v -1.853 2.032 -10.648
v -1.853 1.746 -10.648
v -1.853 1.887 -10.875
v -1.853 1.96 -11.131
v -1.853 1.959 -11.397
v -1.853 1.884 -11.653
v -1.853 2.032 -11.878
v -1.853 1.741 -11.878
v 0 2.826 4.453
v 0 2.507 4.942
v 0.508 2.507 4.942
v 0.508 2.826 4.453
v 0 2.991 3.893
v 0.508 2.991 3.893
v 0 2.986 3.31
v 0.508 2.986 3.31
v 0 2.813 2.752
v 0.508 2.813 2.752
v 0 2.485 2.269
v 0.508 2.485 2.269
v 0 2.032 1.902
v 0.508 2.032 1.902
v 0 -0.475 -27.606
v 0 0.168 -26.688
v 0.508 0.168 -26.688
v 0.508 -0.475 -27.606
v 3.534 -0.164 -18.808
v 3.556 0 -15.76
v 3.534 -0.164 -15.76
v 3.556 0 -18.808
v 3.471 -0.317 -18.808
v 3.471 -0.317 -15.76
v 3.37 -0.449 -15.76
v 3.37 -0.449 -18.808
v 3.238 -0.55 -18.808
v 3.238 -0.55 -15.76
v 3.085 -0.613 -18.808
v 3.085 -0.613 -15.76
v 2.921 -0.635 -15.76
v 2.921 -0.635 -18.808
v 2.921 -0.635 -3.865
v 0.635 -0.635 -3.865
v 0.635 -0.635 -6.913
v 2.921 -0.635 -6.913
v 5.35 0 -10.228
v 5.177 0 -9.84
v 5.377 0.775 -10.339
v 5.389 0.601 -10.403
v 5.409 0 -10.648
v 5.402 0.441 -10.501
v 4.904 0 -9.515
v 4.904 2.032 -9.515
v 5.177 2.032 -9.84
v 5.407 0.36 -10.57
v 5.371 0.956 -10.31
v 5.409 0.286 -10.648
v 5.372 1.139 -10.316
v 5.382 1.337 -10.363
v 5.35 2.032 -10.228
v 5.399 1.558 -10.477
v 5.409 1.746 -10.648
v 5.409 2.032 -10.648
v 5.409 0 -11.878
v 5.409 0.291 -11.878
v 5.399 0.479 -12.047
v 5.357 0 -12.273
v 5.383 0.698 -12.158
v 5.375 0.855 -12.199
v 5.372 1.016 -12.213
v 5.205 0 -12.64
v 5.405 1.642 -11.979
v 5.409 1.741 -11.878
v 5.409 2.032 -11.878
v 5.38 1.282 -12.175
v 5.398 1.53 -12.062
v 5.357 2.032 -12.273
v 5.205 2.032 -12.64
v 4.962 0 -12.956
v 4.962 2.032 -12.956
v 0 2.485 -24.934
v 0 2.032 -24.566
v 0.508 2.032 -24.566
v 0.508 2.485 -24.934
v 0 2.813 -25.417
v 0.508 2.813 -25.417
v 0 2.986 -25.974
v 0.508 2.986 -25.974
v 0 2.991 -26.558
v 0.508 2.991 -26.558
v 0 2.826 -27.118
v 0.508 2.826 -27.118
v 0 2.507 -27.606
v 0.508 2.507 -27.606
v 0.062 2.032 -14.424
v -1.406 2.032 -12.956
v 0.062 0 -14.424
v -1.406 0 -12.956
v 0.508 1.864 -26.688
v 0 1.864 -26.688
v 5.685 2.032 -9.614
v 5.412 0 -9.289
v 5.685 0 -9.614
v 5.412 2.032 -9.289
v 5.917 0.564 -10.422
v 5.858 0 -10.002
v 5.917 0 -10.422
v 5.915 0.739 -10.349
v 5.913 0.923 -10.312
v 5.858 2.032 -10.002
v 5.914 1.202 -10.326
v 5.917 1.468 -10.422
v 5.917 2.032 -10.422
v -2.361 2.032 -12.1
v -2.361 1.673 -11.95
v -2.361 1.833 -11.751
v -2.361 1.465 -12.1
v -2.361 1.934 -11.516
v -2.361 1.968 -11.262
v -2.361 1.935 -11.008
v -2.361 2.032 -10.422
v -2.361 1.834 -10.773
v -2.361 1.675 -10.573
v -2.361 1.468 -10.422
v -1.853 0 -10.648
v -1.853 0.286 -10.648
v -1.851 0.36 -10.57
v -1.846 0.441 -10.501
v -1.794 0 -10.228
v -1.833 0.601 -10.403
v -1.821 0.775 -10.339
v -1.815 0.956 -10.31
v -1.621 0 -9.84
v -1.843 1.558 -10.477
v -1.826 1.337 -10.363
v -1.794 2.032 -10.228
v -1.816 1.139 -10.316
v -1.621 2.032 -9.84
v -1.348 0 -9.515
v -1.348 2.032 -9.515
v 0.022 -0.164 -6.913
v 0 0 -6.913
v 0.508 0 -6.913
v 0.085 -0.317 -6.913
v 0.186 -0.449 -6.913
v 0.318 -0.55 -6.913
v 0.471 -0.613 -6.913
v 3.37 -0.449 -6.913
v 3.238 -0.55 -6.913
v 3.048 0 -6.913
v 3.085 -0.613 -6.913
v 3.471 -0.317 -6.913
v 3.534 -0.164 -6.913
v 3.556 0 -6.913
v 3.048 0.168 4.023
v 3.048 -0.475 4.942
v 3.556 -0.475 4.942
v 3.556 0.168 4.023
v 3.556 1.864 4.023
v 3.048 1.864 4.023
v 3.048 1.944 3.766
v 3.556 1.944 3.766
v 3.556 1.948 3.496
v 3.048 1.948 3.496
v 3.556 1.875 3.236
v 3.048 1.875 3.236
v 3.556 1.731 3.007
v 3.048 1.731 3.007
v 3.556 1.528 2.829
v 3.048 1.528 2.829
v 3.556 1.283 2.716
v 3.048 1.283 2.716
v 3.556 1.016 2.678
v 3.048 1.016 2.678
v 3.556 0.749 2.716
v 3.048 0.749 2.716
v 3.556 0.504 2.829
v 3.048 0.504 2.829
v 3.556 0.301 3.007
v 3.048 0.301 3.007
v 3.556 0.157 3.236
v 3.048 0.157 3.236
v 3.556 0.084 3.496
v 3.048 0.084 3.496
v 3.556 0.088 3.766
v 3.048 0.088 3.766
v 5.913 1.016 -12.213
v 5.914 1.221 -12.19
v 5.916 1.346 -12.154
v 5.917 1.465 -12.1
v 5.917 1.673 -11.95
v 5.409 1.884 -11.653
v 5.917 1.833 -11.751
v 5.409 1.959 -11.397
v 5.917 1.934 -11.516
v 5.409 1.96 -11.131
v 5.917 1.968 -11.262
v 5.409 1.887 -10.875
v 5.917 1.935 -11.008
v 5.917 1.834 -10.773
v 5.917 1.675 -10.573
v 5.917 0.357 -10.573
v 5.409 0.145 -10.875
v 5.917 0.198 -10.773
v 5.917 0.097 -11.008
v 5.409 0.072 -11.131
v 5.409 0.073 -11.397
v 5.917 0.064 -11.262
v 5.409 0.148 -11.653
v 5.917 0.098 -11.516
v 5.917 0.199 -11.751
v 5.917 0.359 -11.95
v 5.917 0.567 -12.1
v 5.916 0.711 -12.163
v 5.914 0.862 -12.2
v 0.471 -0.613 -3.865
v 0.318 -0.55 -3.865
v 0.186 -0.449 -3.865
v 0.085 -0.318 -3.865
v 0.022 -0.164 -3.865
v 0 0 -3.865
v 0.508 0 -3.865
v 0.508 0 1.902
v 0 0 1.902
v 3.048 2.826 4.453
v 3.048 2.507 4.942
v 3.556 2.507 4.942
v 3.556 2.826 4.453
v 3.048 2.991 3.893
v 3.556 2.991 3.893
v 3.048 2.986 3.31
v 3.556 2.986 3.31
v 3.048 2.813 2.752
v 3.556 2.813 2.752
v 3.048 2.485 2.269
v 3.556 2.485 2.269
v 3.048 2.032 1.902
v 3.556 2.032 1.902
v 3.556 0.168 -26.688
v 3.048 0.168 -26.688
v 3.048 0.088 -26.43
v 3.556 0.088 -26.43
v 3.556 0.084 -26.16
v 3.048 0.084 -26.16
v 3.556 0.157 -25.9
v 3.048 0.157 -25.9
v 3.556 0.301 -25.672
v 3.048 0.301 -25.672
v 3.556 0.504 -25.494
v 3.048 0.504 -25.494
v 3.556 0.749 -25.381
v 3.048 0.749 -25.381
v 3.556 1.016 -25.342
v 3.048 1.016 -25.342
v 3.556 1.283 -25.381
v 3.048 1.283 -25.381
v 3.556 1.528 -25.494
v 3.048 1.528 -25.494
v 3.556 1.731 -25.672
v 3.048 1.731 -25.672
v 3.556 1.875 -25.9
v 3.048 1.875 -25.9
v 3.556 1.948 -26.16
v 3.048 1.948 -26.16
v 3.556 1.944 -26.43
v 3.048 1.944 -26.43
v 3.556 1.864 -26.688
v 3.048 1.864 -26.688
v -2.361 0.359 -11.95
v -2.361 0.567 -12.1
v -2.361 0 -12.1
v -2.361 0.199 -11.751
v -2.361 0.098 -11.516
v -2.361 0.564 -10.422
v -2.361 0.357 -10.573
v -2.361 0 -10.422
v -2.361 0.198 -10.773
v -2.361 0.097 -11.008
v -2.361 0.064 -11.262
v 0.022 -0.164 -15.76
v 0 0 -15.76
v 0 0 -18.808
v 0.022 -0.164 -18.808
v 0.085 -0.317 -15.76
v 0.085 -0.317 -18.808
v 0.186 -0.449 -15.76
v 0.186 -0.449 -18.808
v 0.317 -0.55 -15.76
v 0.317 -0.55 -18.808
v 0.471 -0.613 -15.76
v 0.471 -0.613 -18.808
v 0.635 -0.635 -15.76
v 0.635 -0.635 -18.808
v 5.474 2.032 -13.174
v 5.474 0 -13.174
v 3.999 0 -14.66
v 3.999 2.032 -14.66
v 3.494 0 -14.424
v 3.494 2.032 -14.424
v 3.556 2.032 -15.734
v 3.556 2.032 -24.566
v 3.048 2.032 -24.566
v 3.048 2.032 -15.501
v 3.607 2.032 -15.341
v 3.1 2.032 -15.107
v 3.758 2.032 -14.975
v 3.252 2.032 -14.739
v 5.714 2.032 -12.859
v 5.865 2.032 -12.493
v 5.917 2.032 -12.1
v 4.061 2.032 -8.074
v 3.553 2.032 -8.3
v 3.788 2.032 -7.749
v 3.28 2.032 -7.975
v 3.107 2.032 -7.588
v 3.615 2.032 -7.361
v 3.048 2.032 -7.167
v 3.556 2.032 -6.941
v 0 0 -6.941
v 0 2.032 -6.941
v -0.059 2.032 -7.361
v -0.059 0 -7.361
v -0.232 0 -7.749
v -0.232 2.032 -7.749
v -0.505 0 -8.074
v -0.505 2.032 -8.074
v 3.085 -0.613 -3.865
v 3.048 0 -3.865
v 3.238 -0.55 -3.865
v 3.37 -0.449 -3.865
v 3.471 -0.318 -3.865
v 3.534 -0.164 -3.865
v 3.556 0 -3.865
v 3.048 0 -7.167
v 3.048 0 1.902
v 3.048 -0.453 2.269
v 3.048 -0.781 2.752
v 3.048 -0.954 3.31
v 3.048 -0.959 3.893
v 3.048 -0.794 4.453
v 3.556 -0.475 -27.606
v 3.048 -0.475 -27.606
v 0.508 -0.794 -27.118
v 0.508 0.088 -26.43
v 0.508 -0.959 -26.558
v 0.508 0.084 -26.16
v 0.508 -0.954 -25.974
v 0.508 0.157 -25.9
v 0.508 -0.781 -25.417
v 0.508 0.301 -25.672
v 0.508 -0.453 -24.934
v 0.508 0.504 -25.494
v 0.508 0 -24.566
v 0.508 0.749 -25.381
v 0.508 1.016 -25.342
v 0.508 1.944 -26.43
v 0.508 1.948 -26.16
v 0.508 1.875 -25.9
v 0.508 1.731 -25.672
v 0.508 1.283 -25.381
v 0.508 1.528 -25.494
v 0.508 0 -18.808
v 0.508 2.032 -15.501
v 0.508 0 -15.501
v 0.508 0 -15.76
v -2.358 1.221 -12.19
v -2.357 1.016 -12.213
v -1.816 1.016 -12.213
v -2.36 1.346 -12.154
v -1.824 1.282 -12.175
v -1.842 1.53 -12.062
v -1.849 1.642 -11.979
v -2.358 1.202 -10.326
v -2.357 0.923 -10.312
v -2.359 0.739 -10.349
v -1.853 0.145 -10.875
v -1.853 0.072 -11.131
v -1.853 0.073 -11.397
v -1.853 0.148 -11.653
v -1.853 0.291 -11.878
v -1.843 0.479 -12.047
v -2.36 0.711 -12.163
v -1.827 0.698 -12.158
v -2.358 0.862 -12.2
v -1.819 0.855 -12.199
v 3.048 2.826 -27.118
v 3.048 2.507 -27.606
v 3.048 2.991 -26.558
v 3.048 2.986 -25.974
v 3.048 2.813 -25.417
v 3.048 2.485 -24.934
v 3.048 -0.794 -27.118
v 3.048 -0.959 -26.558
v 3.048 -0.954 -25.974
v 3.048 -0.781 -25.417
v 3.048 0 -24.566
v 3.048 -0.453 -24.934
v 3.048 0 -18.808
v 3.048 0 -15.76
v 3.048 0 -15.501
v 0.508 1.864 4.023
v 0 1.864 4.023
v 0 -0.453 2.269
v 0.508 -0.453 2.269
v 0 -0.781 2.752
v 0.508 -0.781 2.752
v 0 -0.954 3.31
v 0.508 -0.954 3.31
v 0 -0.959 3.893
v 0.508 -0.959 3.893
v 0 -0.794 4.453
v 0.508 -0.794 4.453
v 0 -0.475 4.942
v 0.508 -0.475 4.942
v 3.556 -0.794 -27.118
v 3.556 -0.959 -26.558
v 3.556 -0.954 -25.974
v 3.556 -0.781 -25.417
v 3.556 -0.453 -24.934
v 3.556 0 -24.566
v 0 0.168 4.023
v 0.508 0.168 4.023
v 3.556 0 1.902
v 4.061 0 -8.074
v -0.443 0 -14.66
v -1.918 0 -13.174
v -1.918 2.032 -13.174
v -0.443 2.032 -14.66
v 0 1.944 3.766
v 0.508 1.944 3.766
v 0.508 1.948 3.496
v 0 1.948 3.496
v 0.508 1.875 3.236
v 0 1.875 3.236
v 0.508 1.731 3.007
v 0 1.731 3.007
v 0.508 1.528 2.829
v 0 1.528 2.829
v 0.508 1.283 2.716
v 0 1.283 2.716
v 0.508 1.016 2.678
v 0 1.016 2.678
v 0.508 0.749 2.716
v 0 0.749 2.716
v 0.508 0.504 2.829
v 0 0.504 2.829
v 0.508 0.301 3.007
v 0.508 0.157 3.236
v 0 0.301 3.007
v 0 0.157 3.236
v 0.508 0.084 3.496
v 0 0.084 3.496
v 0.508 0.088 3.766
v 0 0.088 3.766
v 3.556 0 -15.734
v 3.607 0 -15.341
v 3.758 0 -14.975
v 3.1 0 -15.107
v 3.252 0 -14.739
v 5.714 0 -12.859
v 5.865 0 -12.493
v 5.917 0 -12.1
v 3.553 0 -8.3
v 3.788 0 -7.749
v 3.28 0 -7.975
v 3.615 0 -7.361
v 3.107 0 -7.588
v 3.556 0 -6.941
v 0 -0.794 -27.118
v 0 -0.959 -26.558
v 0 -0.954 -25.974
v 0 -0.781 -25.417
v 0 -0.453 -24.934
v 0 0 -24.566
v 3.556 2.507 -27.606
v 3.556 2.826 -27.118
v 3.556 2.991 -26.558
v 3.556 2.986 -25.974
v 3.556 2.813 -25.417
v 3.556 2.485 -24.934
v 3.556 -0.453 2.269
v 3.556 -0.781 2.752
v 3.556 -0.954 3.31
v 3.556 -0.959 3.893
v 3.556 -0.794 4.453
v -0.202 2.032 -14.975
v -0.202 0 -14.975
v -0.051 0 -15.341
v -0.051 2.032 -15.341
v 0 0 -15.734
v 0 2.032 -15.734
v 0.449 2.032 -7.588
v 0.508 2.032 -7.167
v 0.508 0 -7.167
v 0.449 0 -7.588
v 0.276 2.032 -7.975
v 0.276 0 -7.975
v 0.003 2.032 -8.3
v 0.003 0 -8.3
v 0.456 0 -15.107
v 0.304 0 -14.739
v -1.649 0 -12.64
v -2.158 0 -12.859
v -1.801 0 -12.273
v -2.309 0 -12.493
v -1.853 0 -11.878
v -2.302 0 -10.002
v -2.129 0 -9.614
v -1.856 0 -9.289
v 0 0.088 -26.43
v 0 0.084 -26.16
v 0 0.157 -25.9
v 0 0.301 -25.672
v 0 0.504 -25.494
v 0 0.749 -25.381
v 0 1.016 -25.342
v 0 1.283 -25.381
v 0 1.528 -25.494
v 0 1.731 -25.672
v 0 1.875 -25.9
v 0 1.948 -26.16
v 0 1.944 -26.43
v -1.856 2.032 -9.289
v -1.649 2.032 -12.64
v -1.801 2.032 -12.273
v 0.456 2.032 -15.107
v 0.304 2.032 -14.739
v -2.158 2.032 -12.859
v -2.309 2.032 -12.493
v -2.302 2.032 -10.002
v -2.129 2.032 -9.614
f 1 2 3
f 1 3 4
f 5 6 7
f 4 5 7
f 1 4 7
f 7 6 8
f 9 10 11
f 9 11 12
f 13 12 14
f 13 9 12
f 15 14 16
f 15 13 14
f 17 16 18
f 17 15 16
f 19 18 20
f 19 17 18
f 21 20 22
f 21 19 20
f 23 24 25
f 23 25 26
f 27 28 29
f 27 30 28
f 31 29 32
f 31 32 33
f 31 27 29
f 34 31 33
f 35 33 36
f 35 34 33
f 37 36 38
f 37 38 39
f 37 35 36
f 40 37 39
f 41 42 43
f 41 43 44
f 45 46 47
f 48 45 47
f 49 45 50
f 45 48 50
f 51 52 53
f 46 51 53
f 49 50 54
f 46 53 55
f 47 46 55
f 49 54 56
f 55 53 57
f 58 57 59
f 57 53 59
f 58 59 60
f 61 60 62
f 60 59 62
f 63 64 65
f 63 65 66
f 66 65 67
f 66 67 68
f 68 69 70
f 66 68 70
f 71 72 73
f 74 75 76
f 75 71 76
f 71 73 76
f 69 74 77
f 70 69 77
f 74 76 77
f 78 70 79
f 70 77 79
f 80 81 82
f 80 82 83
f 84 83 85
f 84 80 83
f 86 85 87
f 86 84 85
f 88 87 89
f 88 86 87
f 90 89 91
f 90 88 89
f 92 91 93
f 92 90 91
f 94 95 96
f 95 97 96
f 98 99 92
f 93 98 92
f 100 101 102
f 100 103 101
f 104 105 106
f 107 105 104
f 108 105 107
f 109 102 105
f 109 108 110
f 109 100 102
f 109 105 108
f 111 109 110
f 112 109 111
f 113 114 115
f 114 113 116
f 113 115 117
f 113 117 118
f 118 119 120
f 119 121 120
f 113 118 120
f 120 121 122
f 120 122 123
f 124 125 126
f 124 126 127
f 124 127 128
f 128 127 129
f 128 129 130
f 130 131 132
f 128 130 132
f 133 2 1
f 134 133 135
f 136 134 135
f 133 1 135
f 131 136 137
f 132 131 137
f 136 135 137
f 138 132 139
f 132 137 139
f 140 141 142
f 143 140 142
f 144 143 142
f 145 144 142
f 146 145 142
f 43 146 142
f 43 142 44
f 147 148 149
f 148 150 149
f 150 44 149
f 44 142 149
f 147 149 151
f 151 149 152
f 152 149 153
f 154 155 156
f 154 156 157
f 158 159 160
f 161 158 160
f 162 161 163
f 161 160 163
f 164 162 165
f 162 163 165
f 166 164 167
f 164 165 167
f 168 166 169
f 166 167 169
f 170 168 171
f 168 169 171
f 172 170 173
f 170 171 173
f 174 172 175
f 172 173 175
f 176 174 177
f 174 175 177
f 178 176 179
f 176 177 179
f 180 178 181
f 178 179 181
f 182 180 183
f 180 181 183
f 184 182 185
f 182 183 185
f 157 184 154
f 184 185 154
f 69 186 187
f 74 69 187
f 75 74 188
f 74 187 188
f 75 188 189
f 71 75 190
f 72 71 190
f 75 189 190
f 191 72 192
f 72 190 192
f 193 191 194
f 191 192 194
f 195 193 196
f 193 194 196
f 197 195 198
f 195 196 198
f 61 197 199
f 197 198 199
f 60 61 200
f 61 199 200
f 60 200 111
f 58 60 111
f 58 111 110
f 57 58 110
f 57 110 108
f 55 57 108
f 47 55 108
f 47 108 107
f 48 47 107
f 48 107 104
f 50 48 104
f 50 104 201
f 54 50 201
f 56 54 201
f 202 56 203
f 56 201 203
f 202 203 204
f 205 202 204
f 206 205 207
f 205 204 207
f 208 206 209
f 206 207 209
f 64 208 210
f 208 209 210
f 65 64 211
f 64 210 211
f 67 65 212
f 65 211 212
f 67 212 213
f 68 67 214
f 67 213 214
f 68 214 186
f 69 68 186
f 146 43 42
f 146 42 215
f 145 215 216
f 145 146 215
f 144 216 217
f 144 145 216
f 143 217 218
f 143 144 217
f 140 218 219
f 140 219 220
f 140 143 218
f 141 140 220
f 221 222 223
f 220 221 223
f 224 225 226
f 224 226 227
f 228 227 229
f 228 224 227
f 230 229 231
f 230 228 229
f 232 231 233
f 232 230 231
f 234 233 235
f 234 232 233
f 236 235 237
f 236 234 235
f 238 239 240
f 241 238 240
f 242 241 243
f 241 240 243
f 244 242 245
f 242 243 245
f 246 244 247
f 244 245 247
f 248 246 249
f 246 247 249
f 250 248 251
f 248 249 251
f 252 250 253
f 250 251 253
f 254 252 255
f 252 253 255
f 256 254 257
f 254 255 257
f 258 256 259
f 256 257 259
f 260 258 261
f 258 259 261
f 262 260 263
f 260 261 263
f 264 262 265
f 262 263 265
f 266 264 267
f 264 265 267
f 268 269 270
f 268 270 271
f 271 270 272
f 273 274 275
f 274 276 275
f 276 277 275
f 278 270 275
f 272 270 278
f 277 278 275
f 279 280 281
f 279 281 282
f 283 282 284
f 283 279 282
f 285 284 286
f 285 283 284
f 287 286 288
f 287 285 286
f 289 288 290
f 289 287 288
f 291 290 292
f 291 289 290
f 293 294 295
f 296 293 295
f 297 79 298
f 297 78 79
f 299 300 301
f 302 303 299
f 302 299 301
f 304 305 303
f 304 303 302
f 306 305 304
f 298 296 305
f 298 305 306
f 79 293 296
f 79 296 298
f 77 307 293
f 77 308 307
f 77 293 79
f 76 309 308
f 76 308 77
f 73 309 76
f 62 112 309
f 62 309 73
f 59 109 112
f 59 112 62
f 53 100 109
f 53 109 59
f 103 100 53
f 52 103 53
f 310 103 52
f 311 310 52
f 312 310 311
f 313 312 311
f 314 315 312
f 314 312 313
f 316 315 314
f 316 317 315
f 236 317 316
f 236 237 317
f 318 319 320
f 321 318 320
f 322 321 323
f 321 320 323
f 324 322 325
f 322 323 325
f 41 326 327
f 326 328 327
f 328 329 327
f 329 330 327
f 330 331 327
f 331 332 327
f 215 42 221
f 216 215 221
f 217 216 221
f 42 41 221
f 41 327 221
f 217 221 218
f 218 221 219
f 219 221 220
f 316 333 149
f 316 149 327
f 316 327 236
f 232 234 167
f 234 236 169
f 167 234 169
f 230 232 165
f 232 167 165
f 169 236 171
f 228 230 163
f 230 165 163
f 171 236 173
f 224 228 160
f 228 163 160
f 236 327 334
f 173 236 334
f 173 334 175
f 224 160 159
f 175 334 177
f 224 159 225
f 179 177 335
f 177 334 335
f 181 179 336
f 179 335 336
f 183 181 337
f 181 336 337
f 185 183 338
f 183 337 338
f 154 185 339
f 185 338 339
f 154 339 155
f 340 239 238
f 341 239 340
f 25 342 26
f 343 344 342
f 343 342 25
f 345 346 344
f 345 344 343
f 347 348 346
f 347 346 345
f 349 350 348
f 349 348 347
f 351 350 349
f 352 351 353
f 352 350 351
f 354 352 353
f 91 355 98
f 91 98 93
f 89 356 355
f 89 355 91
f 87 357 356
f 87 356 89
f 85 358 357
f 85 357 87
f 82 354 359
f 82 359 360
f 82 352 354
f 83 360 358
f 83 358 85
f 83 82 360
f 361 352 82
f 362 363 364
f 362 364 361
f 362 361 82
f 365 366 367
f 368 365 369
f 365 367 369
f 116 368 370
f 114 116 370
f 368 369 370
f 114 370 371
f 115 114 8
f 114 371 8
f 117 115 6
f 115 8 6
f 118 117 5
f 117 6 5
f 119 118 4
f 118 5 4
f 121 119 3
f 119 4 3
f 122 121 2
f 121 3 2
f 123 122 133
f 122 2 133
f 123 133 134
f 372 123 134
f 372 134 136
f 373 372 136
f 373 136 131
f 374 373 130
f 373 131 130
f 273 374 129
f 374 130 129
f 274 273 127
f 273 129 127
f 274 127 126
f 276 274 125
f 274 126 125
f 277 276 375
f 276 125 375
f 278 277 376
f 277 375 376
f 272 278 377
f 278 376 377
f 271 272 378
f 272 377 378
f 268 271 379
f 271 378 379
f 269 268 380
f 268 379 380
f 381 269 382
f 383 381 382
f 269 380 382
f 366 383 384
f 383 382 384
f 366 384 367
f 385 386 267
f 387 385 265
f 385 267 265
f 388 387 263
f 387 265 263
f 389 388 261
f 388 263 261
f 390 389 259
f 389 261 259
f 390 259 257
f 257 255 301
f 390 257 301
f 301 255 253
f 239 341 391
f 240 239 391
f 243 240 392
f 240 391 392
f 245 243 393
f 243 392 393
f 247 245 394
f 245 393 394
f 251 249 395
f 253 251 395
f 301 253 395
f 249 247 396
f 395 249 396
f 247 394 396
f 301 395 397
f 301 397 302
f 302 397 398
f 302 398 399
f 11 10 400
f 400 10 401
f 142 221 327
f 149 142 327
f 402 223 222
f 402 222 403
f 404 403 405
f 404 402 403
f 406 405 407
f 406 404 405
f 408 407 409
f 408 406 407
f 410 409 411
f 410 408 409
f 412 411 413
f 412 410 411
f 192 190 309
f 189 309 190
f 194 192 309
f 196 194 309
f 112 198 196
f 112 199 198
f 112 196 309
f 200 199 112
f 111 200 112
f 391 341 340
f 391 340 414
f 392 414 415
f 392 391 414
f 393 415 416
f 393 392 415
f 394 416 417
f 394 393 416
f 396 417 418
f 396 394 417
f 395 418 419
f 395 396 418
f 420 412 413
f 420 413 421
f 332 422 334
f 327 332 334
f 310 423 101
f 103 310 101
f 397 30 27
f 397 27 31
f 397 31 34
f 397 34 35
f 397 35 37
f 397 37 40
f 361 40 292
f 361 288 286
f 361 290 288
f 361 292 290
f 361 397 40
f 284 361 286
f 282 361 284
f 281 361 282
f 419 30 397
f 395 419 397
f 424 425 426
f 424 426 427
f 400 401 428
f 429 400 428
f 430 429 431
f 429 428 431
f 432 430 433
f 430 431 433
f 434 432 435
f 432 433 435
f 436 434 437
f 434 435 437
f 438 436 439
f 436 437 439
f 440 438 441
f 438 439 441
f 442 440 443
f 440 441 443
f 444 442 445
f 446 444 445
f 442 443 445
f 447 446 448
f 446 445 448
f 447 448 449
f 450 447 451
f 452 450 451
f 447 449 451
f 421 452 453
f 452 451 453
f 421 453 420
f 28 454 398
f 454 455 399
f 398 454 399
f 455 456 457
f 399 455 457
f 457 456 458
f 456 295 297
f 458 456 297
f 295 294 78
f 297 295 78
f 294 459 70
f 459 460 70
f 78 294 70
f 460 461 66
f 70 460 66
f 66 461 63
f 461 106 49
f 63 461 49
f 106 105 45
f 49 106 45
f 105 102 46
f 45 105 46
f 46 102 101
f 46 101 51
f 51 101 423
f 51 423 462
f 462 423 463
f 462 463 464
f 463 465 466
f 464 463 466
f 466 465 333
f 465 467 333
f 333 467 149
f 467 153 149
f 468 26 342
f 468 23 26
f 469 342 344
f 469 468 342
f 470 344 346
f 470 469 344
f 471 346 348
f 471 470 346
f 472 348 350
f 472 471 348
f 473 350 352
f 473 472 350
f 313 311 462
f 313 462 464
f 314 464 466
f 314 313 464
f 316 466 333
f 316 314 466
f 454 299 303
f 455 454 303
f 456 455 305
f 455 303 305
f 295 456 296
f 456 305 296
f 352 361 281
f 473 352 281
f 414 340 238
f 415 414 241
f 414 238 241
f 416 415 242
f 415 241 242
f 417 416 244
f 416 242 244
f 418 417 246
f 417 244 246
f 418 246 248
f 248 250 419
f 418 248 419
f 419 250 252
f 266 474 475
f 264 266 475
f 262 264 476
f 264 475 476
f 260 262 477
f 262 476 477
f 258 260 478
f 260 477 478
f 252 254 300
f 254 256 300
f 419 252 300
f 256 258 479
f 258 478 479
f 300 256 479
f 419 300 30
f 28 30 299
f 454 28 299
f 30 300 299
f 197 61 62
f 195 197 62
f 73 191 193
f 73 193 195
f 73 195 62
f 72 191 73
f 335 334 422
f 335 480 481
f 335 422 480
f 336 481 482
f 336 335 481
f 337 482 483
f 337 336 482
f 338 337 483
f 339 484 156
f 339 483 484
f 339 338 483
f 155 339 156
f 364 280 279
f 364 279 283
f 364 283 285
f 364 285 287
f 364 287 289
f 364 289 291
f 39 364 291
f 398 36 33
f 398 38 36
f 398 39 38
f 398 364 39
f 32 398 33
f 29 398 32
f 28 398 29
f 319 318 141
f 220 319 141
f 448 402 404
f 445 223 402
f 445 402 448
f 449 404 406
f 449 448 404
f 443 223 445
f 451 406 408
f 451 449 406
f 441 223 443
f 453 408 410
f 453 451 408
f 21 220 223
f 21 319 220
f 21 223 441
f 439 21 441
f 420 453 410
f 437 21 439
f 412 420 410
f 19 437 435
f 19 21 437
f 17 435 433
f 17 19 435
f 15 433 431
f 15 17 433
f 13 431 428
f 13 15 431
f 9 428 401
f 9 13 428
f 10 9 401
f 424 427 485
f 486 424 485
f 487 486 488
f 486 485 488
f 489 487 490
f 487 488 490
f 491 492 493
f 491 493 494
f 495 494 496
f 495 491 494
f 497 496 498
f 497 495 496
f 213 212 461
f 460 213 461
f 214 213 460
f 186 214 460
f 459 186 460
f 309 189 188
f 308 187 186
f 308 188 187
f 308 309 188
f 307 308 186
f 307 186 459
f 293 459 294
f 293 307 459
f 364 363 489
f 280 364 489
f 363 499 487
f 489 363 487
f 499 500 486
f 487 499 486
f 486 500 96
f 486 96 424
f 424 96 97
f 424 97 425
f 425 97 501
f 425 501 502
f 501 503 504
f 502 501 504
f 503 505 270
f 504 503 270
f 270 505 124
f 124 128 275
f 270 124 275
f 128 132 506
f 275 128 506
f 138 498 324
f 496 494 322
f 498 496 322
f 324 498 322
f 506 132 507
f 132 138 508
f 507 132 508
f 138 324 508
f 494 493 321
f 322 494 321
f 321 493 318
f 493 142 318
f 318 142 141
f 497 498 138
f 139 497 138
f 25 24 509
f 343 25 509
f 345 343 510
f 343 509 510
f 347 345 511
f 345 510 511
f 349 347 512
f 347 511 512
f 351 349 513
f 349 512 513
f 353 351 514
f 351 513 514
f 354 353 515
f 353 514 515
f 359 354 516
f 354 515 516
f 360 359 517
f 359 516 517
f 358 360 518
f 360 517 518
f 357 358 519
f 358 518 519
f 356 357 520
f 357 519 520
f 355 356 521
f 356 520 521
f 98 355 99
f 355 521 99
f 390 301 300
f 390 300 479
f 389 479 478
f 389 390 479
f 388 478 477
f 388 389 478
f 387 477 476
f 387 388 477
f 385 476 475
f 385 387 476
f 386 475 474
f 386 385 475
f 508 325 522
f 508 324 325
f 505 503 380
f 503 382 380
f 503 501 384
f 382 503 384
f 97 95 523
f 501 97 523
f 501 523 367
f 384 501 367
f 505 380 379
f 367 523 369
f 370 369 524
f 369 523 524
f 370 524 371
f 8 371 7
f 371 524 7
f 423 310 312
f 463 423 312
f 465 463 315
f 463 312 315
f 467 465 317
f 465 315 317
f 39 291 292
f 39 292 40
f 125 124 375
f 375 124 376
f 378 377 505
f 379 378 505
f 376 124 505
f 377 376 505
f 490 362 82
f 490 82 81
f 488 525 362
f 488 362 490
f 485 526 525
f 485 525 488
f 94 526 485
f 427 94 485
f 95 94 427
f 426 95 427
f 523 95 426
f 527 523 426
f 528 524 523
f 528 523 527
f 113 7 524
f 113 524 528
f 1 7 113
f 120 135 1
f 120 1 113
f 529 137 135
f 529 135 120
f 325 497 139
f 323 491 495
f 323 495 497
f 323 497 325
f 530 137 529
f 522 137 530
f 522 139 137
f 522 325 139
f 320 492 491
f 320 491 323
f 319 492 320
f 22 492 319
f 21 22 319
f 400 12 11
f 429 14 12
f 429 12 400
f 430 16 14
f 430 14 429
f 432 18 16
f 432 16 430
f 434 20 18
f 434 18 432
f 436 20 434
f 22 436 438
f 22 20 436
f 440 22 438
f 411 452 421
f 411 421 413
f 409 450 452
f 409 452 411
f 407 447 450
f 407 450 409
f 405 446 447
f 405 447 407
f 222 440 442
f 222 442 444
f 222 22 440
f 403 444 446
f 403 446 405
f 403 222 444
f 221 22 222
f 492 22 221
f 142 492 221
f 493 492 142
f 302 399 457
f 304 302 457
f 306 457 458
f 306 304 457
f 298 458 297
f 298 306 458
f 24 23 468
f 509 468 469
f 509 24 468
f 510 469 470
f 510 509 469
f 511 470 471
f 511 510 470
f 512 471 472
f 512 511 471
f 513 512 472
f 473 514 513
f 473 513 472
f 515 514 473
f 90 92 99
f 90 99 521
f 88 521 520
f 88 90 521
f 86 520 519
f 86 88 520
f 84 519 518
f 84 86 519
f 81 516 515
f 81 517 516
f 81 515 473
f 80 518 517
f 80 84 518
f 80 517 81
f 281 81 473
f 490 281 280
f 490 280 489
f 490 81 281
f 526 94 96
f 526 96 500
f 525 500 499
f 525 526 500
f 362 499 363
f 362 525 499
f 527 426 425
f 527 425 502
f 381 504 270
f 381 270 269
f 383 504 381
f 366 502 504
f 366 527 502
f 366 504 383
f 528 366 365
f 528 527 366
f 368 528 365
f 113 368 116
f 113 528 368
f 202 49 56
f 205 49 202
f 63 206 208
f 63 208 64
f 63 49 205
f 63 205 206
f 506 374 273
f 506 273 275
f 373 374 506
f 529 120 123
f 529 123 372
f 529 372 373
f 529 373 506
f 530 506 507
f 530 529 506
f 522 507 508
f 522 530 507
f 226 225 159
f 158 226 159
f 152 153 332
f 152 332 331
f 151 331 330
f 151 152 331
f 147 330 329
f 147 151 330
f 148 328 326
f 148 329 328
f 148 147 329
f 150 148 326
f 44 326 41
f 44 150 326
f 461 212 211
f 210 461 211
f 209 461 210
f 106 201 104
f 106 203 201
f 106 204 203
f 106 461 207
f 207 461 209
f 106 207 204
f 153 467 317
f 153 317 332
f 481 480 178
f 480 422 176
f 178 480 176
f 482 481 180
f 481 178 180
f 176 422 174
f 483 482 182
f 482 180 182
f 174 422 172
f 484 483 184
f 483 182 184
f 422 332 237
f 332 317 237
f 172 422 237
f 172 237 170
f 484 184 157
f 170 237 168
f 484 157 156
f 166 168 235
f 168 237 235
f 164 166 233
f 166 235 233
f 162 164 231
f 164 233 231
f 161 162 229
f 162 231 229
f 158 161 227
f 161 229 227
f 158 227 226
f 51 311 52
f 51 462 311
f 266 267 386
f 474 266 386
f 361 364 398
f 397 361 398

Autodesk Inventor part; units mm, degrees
ref_plane "YZ Plane" through (0, 0, 0) normal (1, 0, 0) x (0, 1, 0)
ref_plane "XZ Plane" through (0, 0, 0) normal (0, 1, 0) x (-1, 0, 0)
ref_plane "XY Plane" through (0, 0, 0) normal (0, 0, 1) x (1, 0, 0)
sketch "Sketch1" plane through (0, 0, 0) normal (0, 1, 0) x (-1, 0, 0)
  line L0 (-1.778, -22.923) -> (-1.778, 0)
  line L1 (-0.508, -7.6359) -> (-0.508, -7.8464)
  line L2 (0, -7.62) -> (2.3608, -9.743)
  line L3 (-0.508, -7.8464) -> (1.8528, -9.9694)
  line L4 (2.3608, -10.0755) -> (2.3608, -9.743)
  line L5 (1.8528, -9.9694) -> (1.8528, -12.5094)
  line L6 (2.3608, -12.7283) -> (2.3608, -10.0755)
  line L7 (1.8528, -12.5094) -> (-0.508, -14.8702)
  line L8 (2.3608, -12.7283) -> (0, -15.1057)
  line L9 (-0.508, -15.1057) -> (-0.508, -25.2657)
  line L10 (-0.508, -25.2657) -> (0, -25.2657)
  line L11 (0, -25.2657) -> (0, -15.1057)
  line L12 (-0.508, -15.1057) -> (-0.508, -14.8702)
  line L13 (-0.508, -7.6359) -> (-0.508, 2.5241)
  line L14 (-0.508, 2.5241) -> (0, 2.5241)
  line L15 (0, 2.5241) -> (0, -7.62)
  line L16 (-5.4088, -9.9694) -> (-5.4088, -12.5094)
  line L17 (-5.9168, -12.7283) -> (-5.9168, -10.0755)
  line L18 (-3.048, -15.1057) -> (-3.048, -14.8702)
  line L19 (-5.4088, -12.5094) -> (-3.048, -14.8702)
  line L20 (-5.9168, -12.7283) -> (-3.556, -15.1057)
  line L21 (-3.048, -15.1057) -> (-3.048, -25.2657)
  line L22 (-3.048, -25.2657) -> (-3.556, -25.2657)
  line L23 (-3.556, -25.2657) -> (-3.556, -15.1057)
  line L24 (-5.9168, -10.0755) -> (-5.9168, -9.743)
  line L25 (-3.048, -7.8464) -> (-5.4088, -9.9694)
  line L26 (-3.556, -7.62) -> (-5.9168, -9.743)
  line L27 (-3.048, -7.6359) -> (-3.048, -7.8464)
  line L28 (-3.048, 2.5241) -> (-3.556, 2.5241)
  line L29 (-3.556, 2.5241) -> (-3.556, -7.62)
  line L30 (-3.048, -7.6359) -> (-3.048, 2.5241)
  point P0 (2.5714, -13.0979)
  point P1 (-0.508, -7.6086)
  point P2 (-6.1274, -13.0979)
  point P3 (-3.048, -7.6086)
extrude "Extrusion1" add sketch "Sketch1" along normal blind 2.032
sketch "Sketch3" plane through (0, 0, 0) normal (0, -1, 0) x (1, 0, 0)
  line L0 (3.556, 0) -> (3.556, -6.9126) projected
  line L1 (0, -6.9126) -> (3.556, -6.9126)
  line L2 (3.556, -6.9126) -> (3.556, -3.8646)
  line L3 (3.556, -3.8646) -> (0, -3.8646)
  line L4 (0, -3.8646) -> (0, -6.9126)
  line L5 (0, -22.923) -> (0, -15.76) projected
  line L6 (3.556, -15.76) -> (3.556, -22.923) projected
  line L7 (0, -15.76) -> (3.556, -15.76)
  line L8 (3.556, -15.76) -> (3.556, -18.808)
  line L9 (3.556, -18.808) -> (0, -18.808)
  line L10 (0, -18.808) -> (0, -15.76)
  point P0 (0, 0)
  dimension "d33" = 3.048
  dimension "d34" = 3.048
extrude "Extrusion3" add sketch "Sketch3" along normal blind 0.635
fillet "Fillet4" radius 0.635 4 edges at (3.556, -0.635, -5.3886) (0, -0.635, -5.3886) (0, -0.635, -17.284) (3.556, -0.635, -17.284)
sketch "Sketch6" plane through (3.048, 0, -3.8646) normal (0, 0, 1) x (1, 0, 0)
  line L0 (-2.54, 2.032) -> (-0.0025, 2.032)
  line L1 (-0.0025, 2.032) -> (-0.0025, -3.9837)
  line L2 (-0.0025, -3.9837) -> (-2.54, -3.9837)
  line L3 (-2.54, -3.9837) -> (-2.54, 2.032)
  line L4 (-0.0025, -3.9837) -> (-2.54, -3.9837)
  line L5 (-2.54, -3.9837) -> (-2.54, 4.1191)
  line L6 (-2.54, 4.1191) -> (-0.0025, 4.1191)
  line L7 (-0.0025, 4.1191) -> (-0.0025, -3.9837)
  point P0 (-3.048, 0)
extrude "Extrusion6" cut sketch "Sketch6" along normal through all
sketch "Sketch9" plane through (0.508, 0, -18.808) normal (0, 0, -1) x (-1, 0, 0)
  line L0 (0, 0) -> (0.508, 0) projected
  line L1 (0, 0) -> (-2.54, 0)
  line L2 (-2.54, 0) -> (-2.54, 7.62)
  line L3 (-2.54, 7.62) -> (0, 7.62)
  line L4 (0, 7.62) -> (0, 0)
  line L5 (-2.54, 7.62) -> (0, 7.62)
  line L6 (0, 7.62) -> (0, -7.6202)
  line L7 (0, -7.6202) -> (-2.54, -7.6202)
  line L8 (-2.54, -7.6202) -> (-2.54, 7.62)
  dimension "d50" = 2.54
  dimension "d51" = 7.62
extrude "Extrusion8" cut sketch "Sketch9" along normal through all
fillet "Fillet6" radius 1.524 16 edges at (5.9168, 1.016, -9.743) (3.556, 1.016, -7.62) (3.048, 1.016, -7.8464) (5.4088, 1.016, -9.9694) (5.4088, 1.016, -12.5094) (5.9168, 1.016, -12.7283) (3.048, 1.016, -14.8702) (3.556, 1.016, -15.1057) (-2.3608, 1.016, -12.7283) (0, 1.016, -15.1057) (0.508, 1.016, -14.8702) (-1.8528, 1.016, -12.5094) (-2.3608, 1.016, -9.743) (-1.8528, 1.016, -9.9694) (0, 1.016, -7.62) (0.508, 1.016, -7.8464)
sketch "Sketch11" plane through (0, 0, -25.2657) normal (-1, 0, 0) x (0, 0, 1)
  arc A0 (-2.3402, -0.4747) -> (-2.3402, 2.5067) centre (-1.016, 1.016) ccw
  line L0 (-1.016, 0.0802) -> (0.5328, 0.0802) construction
  line L1 (-1.016, 1.9518) -> (0.5328, 1.9518) construction
  arc A1 (-2.3402, -0.4747) -> (-2.3402, 2.5067) centre (-1.016, 1.016) ccw
  arc A2 (-1.4219, 0.1684) -> (-1.4219, 1.8636) centre (-1.016, 1.016) ccw
  line L2 (-1.4219, 1.8636) -> (-2.3402, 2.5067)
  line L3 (-1.4219, 1.8636) -> (-0.3008, 1.8636) construction
  line L4 (-1.4219, 0.1684) -> (-2.3402, -0.4747)
  line L5 (-1.4219, 0.1684) -> (-0.3008, 0.1684) construction
  point P0 (25.2657, 0)
  dimension "d66" = 3.9878
  dimension "d74" = 1.8796
  dimension "d75" = 145
  dimension "d76" = 145
extrude "Extrusion10" add sketch "Sketch11" against normal blind 3.556
sketch "Sketch12" plane through (3.048, 0, -18.808) normal (0, 0, -1) x (-1, 0, 0)
  line L0 (0, -7.62) -> (2.54, -7.62)
  line L1 (2.54, -7.62) -> (2.54, 11.139)
  line L2 (2.54, 11.139) -> (0, 11.139)
  line L3 (0, 11.139) -> (0, -7.62)
  point P0 (3.048, 0)
extrude "Extrusion11" cut sketch "Sketch12" along normal through all
ref_plane "Work Plane3" through (3.048, 0, -11.3322) normal (0, 0, -1) x (-1, 0, 0)
mirror "Mirror2" about plane through (3.048, 0, -11.3322) normal (0, 0, -1) of "Extrusion10"
mirror "Mirror3" about plane through (3.048, 0, -11.3322) normal (0, 0, -1) of "Extrusion11"
sketch "Sketch13" plane through (5.9168, 0, -10.4221) normal (1, 0, 0) x (0, 0, -1)
  circle A0 centre (0.8382, 1.016) radius 0.9525
  point P0 (-10.4221, 0)
  dimension "d77" = 1.905
extrude "Extrusion12" cut sketch "Sketch13" against normal through all
properties part number "rocker" material "Aluminum 6061"
